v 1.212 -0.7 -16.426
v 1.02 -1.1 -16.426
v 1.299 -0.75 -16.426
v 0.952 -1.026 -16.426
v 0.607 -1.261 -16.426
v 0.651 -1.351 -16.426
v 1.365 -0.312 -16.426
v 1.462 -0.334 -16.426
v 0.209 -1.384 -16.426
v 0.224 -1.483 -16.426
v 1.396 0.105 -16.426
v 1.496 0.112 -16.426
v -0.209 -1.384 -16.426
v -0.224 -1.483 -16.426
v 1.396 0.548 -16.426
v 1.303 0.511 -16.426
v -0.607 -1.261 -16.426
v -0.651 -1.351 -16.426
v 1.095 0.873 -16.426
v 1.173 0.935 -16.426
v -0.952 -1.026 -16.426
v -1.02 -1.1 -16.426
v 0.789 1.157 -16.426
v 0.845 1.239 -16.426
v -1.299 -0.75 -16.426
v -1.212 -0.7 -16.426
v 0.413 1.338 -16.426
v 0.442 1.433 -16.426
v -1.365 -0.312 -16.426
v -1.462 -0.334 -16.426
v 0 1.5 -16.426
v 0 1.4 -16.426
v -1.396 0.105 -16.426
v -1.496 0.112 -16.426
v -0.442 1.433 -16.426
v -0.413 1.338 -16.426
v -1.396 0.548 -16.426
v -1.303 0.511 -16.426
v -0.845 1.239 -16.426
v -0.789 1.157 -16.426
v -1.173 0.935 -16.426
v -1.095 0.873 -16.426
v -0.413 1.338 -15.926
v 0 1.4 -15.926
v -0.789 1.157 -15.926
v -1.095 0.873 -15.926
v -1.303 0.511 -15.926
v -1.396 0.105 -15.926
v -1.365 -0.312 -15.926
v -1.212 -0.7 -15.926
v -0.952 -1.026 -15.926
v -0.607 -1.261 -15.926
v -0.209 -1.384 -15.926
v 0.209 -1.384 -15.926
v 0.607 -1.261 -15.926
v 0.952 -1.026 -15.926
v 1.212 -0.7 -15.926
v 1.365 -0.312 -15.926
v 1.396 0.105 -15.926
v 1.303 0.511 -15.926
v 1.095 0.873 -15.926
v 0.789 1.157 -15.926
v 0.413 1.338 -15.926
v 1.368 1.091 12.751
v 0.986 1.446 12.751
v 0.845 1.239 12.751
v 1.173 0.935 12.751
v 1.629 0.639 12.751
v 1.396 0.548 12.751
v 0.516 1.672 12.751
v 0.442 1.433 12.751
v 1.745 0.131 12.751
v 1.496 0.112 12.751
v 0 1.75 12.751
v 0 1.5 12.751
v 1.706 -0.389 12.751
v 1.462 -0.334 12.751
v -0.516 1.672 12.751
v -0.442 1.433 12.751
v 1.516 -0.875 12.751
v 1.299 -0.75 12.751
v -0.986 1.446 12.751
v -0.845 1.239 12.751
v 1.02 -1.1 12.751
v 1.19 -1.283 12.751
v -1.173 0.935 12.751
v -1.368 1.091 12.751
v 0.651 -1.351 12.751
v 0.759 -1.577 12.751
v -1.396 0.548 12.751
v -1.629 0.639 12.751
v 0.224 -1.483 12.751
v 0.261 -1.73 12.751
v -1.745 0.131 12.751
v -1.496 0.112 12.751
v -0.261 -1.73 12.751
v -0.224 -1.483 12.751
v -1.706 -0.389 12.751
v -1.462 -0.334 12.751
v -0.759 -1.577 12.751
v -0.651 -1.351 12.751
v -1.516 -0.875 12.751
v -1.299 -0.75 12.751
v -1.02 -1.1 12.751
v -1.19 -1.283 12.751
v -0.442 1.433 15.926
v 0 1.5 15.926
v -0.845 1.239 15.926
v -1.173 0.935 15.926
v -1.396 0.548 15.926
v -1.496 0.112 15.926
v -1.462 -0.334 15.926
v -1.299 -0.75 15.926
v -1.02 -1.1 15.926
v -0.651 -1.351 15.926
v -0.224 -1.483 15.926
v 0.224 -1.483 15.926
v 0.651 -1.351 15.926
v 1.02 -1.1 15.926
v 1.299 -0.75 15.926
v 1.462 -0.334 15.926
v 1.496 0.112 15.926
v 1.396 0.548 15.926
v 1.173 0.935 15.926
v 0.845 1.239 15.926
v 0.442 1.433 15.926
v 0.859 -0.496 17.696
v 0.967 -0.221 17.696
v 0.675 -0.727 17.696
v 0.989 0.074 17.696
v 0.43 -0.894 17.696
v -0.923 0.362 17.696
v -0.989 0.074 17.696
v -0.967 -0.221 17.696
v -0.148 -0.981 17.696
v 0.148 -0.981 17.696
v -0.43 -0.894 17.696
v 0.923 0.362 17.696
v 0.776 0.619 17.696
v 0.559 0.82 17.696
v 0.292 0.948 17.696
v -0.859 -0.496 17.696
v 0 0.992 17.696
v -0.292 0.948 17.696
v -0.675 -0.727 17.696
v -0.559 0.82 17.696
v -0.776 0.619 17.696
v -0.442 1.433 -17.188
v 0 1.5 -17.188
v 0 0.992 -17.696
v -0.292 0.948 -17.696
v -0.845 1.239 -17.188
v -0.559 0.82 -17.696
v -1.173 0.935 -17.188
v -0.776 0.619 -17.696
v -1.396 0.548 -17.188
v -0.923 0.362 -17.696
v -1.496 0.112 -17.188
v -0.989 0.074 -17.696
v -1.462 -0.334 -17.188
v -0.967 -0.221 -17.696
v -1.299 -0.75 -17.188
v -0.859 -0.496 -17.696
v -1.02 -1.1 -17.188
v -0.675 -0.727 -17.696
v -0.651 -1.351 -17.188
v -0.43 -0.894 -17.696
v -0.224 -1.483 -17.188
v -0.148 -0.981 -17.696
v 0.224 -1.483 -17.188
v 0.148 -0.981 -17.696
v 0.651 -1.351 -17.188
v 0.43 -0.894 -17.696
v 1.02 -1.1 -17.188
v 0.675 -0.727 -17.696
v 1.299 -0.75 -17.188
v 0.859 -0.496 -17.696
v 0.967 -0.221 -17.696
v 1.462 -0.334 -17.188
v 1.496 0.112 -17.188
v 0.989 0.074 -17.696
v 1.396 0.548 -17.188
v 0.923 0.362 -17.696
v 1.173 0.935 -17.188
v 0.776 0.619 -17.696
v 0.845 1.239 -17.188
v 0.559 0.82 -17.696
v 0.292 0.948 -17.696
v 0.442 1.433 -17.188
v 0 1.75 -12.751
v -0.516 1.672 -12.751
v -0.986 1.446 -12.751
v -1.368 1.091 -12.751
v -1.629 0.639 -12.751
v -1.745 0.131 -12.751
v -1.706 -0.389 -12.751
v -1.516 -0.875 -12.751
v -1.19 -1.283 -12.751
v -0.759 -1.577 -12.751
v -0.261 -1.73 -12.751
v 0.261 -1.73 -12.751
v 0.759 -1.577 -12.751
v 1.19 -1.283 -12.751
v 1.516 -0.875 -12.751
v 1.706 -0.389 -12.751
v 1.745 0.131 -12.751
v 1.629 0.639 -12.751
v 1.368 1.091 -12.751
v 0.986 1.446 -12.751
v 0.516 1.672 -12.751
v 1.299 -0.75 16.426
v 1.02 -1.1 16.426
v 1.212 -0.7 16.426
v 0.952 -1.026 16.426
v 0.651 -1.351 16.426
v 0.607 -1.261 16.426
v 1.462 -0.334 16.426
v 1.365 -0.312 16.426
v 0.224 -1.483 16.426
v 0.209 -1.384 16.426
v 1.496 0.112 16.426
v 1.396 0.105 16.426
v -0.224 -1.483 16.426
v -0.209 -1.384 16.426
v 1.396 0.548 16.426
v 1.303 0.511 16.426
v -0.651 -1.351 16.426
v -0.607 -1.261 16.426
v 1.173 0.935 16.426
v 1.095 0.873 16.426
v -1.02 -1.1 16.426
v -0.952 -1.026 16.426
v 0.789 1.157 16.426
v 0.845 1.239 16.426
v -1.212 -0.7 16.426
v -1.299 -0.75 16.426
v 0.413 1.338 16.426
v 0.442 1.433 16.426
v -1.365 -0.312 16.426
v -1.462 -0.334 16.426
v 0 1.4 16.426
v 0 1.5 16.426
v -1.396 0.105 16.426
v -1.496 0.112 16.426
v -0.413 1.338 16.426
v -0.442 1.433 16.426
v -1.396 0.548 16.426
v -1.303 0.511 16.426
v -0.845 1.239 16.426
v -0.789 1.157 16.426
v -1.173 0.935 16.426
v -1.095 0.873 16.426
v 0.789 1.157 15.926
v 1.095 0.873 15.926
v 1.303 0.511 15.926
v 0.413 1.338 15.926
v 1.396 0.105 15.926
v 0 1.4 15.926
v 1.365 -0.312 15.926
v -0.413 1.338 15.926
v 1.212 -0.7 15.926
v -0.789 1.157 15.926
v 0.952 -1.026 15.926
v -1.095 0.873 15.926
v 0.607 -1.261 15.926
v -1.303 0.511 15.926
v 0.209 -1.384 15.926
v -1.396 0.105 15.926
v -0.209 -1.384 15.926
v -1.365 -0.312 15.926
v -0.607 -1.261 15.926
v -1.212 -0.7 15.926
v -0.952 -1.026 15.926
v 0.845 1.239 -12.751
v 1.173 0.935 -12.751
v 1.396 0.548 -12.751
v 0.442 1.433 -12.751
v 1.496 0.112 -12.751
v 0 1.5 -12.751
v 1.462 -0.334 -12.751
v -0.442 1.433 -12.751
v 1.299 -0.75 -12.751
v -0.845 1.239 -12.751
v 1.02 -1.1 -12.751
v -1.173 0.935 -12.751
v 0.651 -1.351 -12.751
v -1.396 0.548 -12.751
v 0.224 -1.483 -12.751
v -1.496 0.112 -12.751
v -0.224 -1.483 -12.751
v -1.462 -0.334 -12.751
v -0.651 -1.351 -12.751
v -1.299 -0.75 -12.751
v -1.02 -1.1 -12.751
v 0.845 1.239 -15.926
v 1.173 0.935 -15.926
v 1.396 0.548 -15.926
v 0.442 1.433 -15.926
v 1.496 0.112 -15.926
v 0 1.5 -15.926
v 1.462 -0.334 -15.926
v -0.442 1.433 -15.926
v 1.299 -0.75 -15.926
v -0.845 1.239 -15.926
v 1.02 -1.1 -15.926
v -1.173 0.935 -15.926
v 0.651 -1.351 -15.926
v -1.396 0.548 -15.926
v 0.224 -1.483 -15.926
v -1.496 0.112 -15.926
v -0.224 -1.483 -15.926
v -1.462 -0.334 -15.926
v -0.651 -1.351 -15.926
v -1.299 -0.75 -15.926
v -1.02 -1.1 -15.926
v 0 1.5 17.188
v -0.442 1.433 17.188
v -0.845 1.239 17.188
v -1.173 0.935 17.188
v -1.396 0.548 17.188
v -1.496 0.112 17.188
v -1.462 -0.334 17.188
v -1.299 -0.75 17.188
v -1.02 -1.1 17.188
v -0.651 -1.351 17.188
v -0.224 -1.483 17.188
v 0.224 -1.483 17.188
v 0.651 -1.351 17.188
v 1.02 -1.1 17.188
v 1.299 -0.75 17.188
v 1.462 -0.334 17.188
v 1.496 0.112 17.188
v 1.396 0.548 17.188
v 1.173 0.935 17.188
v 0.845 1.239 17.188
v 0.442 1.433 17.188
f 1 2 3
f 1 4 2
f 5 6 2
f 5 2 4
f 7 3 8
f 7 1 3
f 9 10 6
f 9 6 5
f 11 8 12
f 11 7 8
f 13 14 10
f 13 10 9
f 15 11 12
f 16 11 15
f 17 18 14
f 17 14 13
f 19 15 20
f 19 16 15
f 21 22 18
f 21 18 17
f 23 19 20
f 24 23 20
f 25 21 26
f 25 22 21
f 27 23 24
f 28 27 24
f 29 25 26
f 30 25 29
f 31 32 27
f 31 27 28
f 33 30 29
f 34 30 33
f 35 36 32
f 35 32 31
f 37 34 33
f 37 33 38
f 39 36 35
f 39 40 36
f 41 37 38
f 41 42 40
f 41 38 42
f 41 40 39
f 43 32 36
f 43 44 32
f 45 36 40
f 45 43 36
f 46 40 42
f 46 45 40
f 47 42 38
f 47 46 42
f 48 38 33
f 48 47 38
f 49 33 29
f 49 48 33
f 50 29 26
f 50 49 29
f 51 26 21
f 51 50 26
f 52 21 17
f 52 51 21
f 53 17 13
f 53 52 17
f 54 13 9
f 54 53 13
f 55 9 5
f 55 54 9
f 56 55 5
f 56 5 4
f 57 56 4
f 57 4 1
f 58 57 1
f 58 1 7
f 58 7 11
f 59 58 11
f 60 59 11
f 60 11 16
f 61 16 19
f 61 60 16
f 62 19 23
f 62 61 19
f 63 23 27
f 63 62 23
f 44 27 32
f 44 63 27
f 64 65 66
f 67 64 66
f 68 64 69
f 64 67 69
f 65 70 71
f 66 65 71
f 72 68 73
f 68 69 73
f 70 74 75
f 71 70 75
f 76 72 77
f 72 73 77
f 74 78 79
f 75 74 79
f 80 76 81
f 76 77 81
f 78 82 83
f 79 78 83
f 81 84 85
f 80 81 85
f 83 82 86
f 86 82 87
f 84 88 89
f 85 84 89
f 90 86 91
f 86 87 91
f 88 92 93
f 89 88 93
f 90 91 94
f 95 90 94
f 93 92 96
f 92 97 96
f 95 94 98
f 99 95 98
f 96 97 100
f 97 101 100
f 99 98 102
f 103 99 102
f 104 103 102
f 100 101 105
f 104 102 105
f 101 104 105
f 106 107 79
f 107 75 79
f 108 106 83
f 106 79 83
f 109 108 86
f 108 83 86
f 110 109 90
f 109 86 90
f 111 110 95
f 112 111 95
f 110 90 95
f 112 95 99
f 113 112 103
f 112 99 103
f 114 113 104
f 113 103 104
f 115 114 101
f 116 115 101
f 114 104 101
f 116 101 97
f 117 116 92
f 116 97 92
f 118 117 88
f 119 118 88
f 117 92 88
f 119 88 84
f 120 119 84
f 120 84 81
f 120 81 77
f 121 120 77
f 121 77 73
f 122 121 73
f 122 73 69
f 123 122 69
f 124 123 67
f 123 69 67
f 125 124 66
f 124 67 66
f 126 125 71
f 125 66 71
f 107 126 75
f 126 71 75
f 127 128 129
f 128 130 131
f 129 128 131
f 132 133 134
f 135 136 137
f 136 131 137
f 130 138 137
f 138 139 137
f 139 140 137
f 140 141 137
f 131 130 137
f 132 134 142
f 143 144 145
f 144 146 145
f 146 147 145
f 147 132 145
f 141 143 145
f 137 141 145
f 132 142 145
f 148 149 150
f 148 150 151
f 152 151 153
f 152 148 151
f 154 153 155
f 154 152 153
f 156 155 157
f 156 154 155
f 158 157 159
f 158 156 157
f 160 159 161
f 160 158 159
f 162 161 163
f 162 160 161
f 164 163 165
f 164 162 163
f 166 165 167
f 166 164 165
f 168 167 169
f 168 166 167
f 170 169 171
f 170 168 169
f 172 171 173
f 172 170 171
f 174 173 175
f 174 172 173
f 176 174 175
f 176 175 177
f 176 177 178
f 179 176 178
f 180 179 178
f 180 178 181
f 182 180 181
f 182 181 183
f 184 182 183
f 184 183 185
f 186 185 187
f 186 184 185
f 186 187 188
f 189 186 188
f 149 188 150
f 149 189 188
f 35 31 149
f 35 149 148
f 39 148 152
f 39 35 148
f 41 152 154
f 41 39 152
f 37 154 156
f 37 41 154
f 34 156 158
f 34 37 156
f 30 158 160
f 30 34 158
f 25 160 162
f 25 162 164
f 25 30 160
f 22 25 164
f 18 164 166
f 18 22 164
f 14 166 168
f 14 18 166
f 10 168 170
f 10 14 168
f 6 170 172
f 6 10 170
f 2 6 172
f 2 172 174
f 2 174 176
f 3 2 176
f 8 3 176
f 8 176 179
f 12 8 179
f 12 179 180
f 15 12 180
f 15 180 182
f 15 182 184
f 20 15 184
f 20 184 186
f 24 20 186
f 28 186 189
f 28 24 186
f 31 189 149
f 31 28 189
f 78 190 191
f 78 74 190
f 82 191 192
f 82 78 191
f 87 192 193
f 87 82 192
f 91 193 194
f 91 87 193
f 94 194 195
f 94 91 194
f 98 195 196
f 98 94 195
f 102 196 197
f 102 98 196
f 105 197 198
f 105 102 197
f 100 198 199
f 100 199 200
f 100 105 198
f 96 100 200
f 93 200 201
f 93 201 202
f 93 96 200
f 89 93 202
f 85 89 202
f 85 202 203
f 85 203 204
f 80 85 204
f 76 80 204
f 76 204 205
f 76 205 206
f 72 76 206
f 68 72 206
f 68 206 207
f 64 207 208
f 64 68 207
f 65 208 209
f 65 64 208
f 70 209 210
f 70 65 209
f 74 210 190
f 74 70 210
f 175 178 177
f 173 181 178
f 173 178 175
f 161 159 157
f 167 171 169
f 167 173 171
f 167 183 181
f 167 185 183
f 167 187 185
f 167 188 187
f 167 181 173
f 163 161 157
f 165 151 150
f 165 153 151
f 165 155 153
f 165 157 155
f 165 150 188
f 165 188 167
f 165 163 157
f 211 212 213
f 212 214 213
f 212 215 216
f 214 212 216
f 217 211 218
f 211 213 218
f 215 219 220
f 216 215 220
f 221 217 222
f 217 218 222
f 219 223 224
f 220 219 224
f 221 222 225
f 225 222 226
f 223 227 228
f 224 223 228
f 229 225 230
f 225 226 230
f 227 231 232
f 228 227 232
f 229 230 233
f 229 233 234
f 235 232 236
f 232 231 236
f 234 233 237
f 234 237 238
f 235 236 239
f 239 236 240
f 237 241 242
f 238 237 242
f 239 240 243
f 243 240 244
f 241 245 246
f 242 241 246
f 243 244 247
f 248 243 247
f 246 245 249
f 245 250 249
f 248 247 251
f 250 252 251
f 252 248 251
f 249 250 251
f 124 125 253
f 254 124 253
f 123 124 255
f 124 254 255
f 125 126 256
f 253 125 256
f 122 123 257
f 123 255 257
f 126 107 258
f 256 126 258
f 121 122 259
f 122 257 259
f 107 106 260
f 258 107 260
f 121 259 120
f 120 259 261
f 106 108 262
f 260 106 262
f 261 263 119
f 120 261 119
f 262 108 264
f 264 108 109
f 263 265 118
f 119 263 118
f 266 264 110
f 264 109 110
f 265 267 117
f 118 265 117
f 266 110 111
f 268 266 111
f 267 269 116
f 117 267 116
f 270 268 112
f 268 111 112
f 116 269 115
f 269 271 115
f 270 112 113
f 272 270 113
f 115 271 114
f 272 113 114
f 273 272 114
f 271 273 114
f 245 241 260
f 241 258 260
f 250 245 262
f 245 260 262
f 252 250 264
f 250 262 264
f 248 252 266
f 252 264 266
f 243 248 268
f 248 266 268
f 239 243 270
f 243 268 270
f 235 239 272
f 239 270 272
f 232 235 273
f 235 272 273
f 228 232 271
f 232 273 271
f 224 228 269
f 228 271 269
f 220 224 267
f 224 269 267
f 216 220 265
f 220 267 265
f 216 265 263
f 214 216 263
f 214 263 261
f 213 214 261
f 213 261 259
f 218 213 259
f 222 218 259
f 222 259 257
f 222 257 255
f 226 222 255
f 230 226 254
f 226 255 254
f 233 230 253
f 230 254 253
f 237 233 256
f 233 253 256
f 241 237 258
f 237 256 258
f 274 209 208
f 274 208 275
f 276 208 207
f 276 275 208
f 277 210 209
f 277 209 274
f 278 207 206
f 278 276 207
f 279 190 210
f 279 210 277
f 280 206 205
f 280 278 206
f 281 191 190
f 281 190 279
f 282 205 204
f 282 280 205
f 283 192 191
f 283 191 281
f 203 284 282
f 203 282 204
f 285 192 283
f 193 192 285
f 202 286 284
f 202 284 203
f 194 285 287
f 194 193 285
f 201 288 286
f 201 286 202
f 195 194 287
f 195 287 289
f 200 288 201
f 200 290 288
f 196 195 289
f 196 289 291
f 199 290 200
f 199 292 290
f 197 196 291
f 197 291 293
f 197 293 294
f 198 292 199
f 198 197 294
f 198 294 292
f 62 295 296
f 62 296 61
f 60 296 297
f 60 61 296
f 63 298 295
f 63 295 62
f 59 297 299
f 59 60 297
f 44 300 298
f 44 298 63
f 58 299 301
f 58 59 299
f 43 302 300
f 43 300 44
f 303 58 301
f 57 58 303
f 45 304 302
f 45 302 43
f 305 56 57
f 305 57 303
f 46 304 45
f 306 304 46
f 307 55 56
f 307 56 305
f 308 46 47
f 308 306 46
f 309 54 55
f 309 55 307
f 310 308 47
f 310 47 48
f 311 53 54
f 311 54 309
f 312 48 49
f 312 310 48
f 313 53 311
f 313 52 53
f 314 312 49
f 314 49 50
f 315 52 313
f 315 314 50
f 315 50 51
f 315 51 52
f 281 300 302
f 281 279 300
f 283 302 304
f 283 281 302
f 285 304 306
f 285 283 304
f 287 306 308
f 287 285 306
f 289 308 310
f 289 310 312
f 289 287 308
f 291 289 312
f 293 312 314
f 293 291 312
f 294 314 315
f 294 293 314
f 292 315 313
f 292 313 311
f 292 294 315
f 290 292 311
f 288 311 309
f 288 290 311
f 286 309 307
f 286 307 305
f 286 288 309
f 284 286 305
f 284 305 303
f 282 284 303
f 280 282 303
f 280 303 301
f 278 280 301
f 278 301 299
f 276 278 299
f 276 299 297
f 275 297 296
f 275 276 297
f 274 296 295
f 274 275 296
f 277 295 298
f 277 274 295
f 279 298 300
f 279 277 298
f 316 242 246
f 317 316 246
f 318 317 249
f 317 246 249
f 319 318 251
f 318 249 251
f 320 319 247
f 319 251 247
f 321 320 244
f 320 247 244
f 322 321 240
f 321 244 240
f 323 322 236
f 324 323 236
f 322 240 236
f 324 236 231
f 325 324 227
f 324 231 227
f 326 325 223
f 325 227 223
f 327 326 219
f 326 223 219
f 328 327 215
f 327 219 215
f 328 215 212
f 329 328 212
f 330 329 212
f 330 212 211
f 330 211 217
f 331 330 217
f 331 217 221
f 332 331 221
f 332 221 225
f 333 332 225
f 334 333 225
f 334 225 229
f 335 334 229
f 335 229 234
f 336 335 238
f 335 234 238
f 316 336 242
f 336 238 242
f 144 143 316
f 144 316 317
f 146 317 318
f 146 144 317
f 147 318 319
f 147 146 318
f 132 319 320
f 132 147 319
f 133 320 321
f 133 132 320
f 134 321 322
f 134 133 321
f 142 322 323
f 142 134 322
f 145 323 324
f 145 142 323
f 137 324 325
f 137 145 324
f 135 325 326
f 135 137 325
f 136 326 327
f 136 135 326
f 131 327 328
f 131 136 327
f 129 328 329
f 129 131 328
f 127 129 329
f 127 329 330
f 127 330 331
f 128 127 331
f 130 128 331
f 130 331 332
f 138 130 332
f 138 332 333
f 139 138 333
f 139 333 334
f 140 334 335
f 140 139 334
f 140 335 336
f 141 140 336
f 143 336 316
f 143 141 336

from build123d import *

# Parameters (mm, degrees)
CHAMFER1_SIZE = 0.508


with BuildPart() as part:
    # Sketch1 → Revolve2 (revolve)
    with BuildSketch(Plane(origin=(0, 0, 0), x_dir=(0, 0, -1), z_dir=(1, 0, 0))):
        Polygon((-17.6958, 0), (-17.6958, 1.5), (-16.4258, 1.5), (-16.4258, 1.4), (-15.9258, 1.4), (-15.9258, 1.5), (-12.7508, 1.5), (-12.7508, 1.75), (0, 1.75), (0, 0), align=None)
    revolve2 = revolve(axis=Axis((0, 0, 0.682962963), (0, 0, 1)))

    # Mirror1: Revolve2 across plane
    add(revolve2.mirror(Plane.XY))

    # Chamfer1
    chamfer1_edges = [part.edges().sort_by_distance(p)[0] for p in [
        (0, -1.5, -17.6958),
        (0, -1.5, 17.6958),
    ]]
    chamfer(chamfer1_edges, length=CHAMFER1_SIZE)


solid = part.part
